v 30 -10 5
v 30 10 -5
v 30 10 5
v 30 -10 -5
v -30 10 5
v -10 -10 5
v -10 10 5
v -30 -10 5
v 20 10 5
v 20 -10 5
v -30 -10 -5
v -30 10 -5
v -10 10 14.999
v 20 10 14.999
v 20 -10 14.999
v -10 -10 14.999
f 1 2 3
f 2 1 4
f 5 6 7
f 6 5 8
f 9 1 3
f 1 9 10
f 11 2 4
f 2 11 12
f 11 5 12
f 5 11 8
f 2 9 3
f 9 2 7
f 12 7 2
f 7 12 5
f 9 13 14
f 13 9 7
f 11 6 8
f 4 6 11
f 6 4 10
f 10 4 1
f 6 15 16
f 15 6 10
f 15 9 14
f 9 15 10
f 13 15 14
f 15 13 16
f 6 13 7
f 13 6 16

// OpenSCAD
cube([60,20,10],center=true);
translate([5,0,10 - 0.001])
    cube([30,20,10],center=true);
cylinder(h=3,r=8);
